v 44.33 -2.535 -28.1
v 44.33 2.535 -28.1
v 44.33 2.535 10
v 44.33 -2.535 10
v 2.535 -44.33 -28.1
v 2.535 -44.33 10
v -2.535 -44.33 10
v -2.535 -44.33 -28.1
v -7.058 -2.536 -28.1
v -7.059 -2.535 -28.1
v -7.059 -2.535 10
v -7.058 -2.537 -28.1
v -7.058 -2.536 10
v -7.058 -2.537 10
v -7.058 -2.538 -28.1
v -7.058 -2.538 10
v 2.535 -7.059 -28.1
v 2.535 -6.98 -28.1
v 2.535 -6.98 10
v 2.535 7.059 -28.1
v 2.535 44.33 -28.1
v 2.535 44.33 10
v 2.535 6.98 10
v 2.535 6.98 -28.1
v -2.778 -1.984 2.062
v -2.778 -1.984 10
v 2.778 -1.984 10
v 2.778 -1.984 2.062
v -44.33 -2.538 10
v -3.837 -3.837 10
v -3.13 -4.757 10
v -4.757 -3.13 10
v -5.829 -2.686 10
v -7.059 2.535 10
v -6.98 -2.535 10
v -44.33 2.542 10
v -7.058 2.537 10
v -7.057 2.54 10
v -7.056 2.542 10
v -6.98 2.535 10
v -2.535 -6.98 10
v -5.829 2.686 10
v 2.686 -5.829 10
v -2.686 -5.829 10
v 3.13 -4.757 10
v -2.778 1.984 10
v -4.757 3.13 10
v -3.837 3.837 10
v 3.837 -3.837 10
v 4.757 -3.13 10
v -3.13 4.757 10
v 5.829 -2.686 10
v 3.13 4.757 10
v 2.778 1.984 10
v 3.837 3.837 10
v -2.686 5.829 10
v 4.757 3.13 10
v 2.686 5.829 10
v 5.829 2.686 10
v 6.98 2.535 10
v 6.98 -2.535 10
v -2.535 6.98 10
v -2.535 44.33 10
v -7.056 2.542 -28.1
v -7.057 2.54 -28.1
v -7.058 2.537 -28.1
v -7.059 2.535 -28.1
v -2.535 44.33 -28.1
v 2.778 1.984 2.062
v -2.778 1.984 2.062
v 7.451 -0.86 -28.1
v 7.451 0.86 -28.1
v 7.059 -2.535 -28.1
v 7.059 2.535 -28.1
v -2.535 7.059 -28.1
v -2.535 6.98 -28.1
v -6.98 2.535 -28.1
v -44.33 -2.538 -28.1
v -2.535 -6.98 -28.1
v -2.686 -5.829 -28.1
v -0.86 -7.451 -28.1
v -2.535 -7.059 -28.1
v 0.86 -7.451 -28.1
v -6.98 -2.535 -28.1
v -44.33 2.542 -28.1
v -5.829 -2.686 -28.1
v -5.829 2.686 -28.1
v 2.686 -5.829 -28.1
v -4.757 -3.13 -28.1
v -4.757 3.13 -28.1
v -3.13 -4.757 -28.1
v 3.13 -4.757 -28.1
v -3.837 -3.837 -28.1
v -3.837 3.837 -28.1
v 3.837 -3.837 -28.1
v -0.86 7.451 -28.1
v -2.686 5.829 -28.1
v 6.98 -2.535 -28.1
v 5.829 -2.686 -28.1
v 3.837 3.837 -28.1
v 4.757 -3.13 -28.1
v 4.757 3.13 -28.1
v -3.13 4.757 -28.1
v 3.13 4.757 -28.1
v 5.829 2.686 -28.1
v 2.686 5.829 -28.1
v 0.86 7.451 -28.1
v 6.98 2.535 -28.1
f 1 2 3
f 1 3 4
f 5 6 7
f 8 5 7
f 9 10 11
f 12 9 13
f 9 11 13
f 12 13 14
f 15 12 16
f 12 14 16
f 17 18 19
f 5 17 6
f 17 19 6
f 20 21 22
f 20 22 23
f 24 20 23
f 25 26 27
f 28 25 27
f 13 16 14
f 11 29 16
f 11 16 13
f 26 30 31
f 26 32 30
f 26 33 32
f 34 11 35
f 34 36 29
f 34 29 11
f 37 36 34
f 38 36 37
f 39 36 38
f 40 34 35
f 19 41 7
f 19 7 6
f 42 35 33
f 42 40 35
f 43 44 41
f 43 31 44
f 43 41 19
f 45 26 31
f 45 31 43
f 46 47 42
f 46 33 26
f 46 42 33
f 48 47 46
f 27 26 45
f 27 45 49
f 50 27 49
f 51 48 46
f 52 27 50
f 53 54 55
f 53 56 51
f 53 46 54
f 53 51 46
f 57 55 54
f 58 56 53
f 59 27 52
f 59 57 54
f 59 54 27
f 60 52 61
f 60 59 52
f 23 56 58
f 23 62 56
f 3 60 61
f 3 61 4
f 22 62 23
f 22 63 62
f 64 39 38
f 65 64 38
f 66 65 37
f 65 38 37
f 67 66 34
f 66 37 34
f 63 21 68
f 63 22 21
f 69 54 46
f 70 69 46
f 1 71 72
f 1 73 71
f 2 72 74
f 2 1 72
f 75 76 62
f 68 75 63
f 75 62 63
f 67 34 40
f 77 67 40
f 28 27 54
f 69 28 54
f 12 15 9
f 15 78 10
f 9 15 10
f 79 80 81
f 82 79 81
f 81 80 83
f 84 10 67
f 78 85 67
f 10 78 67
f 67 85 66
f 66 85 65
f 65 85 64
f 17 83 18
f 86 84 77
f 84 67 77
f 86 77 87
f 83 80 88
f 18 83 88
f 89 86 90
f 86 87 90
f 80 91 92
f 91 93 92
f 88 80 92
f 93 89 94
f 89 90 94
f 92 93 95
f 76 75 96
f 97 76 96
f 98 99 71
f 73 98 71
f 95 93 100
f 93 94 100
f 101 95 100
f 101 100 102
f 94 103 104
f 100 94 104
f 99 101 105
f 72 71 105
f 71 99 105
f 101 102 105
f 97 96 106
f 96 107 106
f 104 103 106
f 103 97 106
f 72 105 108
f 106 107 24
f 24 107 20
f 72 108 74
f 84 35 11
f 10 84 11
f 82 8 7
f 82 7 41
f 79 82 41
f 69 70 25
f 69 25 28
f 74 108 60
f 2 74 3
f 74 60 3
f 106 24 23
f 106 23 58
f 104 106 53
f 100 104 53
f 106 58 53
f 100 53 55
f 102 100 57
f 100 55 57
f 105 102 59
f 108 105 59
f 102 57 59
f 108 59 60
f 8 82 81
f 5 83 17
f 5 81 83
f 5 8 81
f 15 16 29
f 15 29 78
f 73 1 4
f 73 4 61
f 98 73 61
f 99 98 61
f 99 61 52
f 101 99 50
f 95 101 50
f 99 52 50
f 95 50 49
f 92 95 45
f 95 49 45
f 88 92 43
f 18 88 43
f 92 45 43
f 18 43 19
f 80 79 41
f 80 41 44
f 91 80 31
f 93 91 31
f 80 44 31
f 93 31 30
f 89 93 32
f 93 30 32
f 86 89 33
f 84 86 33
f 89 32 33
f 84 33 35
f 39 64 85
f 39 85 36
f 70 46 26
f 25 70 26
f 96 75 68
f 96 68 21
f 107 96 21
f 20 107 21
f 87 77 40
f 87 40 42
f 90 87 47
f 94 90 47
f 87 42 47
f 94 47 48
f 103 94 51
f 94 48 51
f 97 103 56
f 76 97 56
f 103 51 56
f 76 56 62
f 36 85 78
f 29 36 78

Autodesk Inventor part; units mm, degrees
sketch "Sketch1" plane through (0, 0, 0) normal (0, 0, 1) x (1, 0, 0)
  circle A0 centre (0, 0) radius 7.5
  dimension "d0" = 15
extrude "Extrusion1" add sketch "Sketch1" along normal blind 10 and the other way blind 28.1
sketch "Sketch2" plane through (0, 0, 10) normal (0, 0, 1) x (1, 0, 0)
  line L0 (-2.7781, -1.9844) -> (2.7781, -1.9844)
  line L1 (2.7781, -1.9844) -> (2.7781, 1.9844)
  line L2 (2.7781, 1.9844) -> (-2.7781, 1.9844)
  line L3 (-2.7781, 1.9844) -> (-2.7781, -1.9844)
  line L4 (-2.7781, -1.9844) -> (2.7781, 1.9844) construction
  line L5 (2.7781, -1.9844) -> (-2.7781, 1.9844) construction
  point P0 (0, 0)
  dimension "d3" = 5.5563
  dimension "d4" = 3.9688
extrude "Extrusion2" cut sketch "Sketch2" against normal blind 7.9375
ref_plane "Work Plane1" through (0, 0, 0) normal (0, 1, 0) x (0, 0, 1)
ref_plane "Work Plane2" through (0, 0, 0) normal (-1, 0, 0) x (0, 0, 1)
sketch "Sketch3" plane through (0, 0, 0) normal (0, 1, 0) x (0, 0, 1)
  point P0 (0, 0)
ref_plane "Work Plane3" through (0, 7.5, 0) normal (0, 1, 0) x (-1, 0, 0)
ref_plane "Work Plane4" through (0, -7.5, 0) normal (0, 1, 0) x (-1, 0, 0)
ref_plane "Work Plane5" through (-7.5, 0, 0) normal (-1, 0, 0) x (0, -1, 0)
ref_plane "Work Plane6" through (7.5, 0, 0) normal (-1, 0, 0) x (0, -1, 0)
sketch "Sketch4" plane through (0, 7.5, 0) normal (0, 1, 0) x (-1, 0, 0)
  point P0 (0, 0)
sketch "Sketch5" plane through (0, 7.5, 0) normal (0, 1, 0) x (-1, 0, 0)
  line L0 (7.5, 10) -> (-7.5, 10) projected
  line L1 (-2.5348, 10) -> (2.5348, 10)
  line L2 (2.5348, 10) -> (2.5348, -28.0998)
  line L3 (2.5348, -28.0998) -> (-2.5348, -28.0998)
  line L4 (-2.5348, -28.0998) -> (-2.5348, 10)
  point P0 (0, 0)
sketch "Sketch6" plane through (7.5, 0, 0) normal (-1, 0, 0) x (0, -1, 0)
  line L0 (-2.5348, 10) -> (2.5348, 10)
  line L1 (2.5348, 10) -> (2.5348, -28.0998)
  line L2 (2.5348, -28.0998) -> (-2.5348, -28.0998)
  line L3 (-2.5348, -28.0998) -> (-2.5348, 10)
  point P0 (0, 0)
sketch "Sketch7" plane through (0, -7.5, 0) normal (0, 1, 0) x (-1, 0, 0)
  point P0 (0, 0)
sketch "Sketch8" plane through (0, -7.5, 0) normal (0, 1, 0) x (-1, 0, 0)
  line L0 (-2.5348, 10) -> (2.5348, 10)
  line L1 (2.5348, 10) -> (2.5348, -28.0998)
  line L2 (2.5348, -28.0998) -> (-2.5348, -28.0998)
  line L3 (-2.5348, -28.0998) -> (-2.5348, 10)
  point P0 (0, 0)
sketch "Sketch9" plane through (0, -7.5, 0) normal (0, 1, 0) x (-1, 0, 0)
  point P0 (0, 0)
sketch "Sketch10" plane through (-7.5, 0, 0) normal (-1, 0, 0) x (0, -1, 0)
  line L0 (7.5, 10) -> (-7.5, 10) projected
  line L1 (-2.5422, 10) -> (2.5378, 10)
  line L2 (2.5378, 10) -> (2.5378, -28.1)
  line L3 (2.5378, -28.1) -> (-2.5422, -28.1)
  line L4 (-2.5422, -28.1) -> (-2.5422, 10)
  point P0 (0, 0)
  dimension "d9" = 5.08
  dimension "d10" = 38.1
extrude "Extrusion3" add sketch "Sketch5" along normal blind 36.83 and the other way blind 1.27
extrude "Extrusion4" add sketch "Sketch6" along normal blind 1.27 and the other way blind 36.83
extrude "Extrusion5" add sketch "Sketch10" along normal blind 36.83 and the other way blind 1.27
extrude "Extrusion6" add sketch "Sketch8" along normal blind 1.27 and the other way blind 36.83
sketch "Sketch11" plane through (0, 0, 10) normal (0, 0, 1) x (1, 0, 0)
  line L0 (2.5348, 7.0587) -> (2.5348, 6.9798)
  line L1 (44.33, 2.5348) -> (7.0587, 2.5348) projected
  line L2 (6.9798, 2.5348) -> (7.0587, 2.5348)
  arc A0 (2.5348, 6.9798) -> (6.9798, 2.5348) centre (6.9798, 6.9798) ccw
  arc A1 (7.0587, 2.5348) -> (2.5348, 7.0587) centre (0, 0) ccw projected
  arc A2 (7.0587, 2.5348) -> (2.5348, 7.0587) centre (0, 0) ccw
  arc A3 (-2.5348, 7.0587) -> (-7.0587, 2.5348) centre (0, 0) ccw
  arc A4 (-6.9798, 2.5348) -> (-2.5348, 6.9798) centre (-6.9798, 6.9798) ccw
  line L3 (-7.0587, 2.5348) -> (-6.9798, 2.5348)
  line L4 (-2.5348, 6.9798) -> (-2.5348, 7.0587)
  arc A5 (-7.0587, -2.5348) -> (-2.5348, -7.0587) centre (0, 0) ccw
  arc A6 (-2.5348, -6.9798) -> (-6.9798, -2.5348) centre (-6.9798, -6.9798) ccw
  line L5 (-2.5348, -7.0587) -> (-2.5348, -6.9798)
  line L6 (-6.9798, -2.5348) -> (-7.0587, -2.5348)
  arc A7 (2.5348, -7.0587) -> (7.0587, -2.5348) centre (0, 0) ccw
  arc A8 (6.9798, -2.5348) -> (2.5348, -6.9798) centre (6.9798, -6.9798) ccw
  line L7 (7.0587, -2.5348) -> (6.9798, -2.5348)
  line L8 (2.5348, -6.9798) -> (2.5348, -7.0587)
  dimension "d29" = 4.445
  dimension "d32" = 360
extrude "Extrusion7" cut sketch "Sketch11" against normal blind 38.1
properties part number "windmillv2"
